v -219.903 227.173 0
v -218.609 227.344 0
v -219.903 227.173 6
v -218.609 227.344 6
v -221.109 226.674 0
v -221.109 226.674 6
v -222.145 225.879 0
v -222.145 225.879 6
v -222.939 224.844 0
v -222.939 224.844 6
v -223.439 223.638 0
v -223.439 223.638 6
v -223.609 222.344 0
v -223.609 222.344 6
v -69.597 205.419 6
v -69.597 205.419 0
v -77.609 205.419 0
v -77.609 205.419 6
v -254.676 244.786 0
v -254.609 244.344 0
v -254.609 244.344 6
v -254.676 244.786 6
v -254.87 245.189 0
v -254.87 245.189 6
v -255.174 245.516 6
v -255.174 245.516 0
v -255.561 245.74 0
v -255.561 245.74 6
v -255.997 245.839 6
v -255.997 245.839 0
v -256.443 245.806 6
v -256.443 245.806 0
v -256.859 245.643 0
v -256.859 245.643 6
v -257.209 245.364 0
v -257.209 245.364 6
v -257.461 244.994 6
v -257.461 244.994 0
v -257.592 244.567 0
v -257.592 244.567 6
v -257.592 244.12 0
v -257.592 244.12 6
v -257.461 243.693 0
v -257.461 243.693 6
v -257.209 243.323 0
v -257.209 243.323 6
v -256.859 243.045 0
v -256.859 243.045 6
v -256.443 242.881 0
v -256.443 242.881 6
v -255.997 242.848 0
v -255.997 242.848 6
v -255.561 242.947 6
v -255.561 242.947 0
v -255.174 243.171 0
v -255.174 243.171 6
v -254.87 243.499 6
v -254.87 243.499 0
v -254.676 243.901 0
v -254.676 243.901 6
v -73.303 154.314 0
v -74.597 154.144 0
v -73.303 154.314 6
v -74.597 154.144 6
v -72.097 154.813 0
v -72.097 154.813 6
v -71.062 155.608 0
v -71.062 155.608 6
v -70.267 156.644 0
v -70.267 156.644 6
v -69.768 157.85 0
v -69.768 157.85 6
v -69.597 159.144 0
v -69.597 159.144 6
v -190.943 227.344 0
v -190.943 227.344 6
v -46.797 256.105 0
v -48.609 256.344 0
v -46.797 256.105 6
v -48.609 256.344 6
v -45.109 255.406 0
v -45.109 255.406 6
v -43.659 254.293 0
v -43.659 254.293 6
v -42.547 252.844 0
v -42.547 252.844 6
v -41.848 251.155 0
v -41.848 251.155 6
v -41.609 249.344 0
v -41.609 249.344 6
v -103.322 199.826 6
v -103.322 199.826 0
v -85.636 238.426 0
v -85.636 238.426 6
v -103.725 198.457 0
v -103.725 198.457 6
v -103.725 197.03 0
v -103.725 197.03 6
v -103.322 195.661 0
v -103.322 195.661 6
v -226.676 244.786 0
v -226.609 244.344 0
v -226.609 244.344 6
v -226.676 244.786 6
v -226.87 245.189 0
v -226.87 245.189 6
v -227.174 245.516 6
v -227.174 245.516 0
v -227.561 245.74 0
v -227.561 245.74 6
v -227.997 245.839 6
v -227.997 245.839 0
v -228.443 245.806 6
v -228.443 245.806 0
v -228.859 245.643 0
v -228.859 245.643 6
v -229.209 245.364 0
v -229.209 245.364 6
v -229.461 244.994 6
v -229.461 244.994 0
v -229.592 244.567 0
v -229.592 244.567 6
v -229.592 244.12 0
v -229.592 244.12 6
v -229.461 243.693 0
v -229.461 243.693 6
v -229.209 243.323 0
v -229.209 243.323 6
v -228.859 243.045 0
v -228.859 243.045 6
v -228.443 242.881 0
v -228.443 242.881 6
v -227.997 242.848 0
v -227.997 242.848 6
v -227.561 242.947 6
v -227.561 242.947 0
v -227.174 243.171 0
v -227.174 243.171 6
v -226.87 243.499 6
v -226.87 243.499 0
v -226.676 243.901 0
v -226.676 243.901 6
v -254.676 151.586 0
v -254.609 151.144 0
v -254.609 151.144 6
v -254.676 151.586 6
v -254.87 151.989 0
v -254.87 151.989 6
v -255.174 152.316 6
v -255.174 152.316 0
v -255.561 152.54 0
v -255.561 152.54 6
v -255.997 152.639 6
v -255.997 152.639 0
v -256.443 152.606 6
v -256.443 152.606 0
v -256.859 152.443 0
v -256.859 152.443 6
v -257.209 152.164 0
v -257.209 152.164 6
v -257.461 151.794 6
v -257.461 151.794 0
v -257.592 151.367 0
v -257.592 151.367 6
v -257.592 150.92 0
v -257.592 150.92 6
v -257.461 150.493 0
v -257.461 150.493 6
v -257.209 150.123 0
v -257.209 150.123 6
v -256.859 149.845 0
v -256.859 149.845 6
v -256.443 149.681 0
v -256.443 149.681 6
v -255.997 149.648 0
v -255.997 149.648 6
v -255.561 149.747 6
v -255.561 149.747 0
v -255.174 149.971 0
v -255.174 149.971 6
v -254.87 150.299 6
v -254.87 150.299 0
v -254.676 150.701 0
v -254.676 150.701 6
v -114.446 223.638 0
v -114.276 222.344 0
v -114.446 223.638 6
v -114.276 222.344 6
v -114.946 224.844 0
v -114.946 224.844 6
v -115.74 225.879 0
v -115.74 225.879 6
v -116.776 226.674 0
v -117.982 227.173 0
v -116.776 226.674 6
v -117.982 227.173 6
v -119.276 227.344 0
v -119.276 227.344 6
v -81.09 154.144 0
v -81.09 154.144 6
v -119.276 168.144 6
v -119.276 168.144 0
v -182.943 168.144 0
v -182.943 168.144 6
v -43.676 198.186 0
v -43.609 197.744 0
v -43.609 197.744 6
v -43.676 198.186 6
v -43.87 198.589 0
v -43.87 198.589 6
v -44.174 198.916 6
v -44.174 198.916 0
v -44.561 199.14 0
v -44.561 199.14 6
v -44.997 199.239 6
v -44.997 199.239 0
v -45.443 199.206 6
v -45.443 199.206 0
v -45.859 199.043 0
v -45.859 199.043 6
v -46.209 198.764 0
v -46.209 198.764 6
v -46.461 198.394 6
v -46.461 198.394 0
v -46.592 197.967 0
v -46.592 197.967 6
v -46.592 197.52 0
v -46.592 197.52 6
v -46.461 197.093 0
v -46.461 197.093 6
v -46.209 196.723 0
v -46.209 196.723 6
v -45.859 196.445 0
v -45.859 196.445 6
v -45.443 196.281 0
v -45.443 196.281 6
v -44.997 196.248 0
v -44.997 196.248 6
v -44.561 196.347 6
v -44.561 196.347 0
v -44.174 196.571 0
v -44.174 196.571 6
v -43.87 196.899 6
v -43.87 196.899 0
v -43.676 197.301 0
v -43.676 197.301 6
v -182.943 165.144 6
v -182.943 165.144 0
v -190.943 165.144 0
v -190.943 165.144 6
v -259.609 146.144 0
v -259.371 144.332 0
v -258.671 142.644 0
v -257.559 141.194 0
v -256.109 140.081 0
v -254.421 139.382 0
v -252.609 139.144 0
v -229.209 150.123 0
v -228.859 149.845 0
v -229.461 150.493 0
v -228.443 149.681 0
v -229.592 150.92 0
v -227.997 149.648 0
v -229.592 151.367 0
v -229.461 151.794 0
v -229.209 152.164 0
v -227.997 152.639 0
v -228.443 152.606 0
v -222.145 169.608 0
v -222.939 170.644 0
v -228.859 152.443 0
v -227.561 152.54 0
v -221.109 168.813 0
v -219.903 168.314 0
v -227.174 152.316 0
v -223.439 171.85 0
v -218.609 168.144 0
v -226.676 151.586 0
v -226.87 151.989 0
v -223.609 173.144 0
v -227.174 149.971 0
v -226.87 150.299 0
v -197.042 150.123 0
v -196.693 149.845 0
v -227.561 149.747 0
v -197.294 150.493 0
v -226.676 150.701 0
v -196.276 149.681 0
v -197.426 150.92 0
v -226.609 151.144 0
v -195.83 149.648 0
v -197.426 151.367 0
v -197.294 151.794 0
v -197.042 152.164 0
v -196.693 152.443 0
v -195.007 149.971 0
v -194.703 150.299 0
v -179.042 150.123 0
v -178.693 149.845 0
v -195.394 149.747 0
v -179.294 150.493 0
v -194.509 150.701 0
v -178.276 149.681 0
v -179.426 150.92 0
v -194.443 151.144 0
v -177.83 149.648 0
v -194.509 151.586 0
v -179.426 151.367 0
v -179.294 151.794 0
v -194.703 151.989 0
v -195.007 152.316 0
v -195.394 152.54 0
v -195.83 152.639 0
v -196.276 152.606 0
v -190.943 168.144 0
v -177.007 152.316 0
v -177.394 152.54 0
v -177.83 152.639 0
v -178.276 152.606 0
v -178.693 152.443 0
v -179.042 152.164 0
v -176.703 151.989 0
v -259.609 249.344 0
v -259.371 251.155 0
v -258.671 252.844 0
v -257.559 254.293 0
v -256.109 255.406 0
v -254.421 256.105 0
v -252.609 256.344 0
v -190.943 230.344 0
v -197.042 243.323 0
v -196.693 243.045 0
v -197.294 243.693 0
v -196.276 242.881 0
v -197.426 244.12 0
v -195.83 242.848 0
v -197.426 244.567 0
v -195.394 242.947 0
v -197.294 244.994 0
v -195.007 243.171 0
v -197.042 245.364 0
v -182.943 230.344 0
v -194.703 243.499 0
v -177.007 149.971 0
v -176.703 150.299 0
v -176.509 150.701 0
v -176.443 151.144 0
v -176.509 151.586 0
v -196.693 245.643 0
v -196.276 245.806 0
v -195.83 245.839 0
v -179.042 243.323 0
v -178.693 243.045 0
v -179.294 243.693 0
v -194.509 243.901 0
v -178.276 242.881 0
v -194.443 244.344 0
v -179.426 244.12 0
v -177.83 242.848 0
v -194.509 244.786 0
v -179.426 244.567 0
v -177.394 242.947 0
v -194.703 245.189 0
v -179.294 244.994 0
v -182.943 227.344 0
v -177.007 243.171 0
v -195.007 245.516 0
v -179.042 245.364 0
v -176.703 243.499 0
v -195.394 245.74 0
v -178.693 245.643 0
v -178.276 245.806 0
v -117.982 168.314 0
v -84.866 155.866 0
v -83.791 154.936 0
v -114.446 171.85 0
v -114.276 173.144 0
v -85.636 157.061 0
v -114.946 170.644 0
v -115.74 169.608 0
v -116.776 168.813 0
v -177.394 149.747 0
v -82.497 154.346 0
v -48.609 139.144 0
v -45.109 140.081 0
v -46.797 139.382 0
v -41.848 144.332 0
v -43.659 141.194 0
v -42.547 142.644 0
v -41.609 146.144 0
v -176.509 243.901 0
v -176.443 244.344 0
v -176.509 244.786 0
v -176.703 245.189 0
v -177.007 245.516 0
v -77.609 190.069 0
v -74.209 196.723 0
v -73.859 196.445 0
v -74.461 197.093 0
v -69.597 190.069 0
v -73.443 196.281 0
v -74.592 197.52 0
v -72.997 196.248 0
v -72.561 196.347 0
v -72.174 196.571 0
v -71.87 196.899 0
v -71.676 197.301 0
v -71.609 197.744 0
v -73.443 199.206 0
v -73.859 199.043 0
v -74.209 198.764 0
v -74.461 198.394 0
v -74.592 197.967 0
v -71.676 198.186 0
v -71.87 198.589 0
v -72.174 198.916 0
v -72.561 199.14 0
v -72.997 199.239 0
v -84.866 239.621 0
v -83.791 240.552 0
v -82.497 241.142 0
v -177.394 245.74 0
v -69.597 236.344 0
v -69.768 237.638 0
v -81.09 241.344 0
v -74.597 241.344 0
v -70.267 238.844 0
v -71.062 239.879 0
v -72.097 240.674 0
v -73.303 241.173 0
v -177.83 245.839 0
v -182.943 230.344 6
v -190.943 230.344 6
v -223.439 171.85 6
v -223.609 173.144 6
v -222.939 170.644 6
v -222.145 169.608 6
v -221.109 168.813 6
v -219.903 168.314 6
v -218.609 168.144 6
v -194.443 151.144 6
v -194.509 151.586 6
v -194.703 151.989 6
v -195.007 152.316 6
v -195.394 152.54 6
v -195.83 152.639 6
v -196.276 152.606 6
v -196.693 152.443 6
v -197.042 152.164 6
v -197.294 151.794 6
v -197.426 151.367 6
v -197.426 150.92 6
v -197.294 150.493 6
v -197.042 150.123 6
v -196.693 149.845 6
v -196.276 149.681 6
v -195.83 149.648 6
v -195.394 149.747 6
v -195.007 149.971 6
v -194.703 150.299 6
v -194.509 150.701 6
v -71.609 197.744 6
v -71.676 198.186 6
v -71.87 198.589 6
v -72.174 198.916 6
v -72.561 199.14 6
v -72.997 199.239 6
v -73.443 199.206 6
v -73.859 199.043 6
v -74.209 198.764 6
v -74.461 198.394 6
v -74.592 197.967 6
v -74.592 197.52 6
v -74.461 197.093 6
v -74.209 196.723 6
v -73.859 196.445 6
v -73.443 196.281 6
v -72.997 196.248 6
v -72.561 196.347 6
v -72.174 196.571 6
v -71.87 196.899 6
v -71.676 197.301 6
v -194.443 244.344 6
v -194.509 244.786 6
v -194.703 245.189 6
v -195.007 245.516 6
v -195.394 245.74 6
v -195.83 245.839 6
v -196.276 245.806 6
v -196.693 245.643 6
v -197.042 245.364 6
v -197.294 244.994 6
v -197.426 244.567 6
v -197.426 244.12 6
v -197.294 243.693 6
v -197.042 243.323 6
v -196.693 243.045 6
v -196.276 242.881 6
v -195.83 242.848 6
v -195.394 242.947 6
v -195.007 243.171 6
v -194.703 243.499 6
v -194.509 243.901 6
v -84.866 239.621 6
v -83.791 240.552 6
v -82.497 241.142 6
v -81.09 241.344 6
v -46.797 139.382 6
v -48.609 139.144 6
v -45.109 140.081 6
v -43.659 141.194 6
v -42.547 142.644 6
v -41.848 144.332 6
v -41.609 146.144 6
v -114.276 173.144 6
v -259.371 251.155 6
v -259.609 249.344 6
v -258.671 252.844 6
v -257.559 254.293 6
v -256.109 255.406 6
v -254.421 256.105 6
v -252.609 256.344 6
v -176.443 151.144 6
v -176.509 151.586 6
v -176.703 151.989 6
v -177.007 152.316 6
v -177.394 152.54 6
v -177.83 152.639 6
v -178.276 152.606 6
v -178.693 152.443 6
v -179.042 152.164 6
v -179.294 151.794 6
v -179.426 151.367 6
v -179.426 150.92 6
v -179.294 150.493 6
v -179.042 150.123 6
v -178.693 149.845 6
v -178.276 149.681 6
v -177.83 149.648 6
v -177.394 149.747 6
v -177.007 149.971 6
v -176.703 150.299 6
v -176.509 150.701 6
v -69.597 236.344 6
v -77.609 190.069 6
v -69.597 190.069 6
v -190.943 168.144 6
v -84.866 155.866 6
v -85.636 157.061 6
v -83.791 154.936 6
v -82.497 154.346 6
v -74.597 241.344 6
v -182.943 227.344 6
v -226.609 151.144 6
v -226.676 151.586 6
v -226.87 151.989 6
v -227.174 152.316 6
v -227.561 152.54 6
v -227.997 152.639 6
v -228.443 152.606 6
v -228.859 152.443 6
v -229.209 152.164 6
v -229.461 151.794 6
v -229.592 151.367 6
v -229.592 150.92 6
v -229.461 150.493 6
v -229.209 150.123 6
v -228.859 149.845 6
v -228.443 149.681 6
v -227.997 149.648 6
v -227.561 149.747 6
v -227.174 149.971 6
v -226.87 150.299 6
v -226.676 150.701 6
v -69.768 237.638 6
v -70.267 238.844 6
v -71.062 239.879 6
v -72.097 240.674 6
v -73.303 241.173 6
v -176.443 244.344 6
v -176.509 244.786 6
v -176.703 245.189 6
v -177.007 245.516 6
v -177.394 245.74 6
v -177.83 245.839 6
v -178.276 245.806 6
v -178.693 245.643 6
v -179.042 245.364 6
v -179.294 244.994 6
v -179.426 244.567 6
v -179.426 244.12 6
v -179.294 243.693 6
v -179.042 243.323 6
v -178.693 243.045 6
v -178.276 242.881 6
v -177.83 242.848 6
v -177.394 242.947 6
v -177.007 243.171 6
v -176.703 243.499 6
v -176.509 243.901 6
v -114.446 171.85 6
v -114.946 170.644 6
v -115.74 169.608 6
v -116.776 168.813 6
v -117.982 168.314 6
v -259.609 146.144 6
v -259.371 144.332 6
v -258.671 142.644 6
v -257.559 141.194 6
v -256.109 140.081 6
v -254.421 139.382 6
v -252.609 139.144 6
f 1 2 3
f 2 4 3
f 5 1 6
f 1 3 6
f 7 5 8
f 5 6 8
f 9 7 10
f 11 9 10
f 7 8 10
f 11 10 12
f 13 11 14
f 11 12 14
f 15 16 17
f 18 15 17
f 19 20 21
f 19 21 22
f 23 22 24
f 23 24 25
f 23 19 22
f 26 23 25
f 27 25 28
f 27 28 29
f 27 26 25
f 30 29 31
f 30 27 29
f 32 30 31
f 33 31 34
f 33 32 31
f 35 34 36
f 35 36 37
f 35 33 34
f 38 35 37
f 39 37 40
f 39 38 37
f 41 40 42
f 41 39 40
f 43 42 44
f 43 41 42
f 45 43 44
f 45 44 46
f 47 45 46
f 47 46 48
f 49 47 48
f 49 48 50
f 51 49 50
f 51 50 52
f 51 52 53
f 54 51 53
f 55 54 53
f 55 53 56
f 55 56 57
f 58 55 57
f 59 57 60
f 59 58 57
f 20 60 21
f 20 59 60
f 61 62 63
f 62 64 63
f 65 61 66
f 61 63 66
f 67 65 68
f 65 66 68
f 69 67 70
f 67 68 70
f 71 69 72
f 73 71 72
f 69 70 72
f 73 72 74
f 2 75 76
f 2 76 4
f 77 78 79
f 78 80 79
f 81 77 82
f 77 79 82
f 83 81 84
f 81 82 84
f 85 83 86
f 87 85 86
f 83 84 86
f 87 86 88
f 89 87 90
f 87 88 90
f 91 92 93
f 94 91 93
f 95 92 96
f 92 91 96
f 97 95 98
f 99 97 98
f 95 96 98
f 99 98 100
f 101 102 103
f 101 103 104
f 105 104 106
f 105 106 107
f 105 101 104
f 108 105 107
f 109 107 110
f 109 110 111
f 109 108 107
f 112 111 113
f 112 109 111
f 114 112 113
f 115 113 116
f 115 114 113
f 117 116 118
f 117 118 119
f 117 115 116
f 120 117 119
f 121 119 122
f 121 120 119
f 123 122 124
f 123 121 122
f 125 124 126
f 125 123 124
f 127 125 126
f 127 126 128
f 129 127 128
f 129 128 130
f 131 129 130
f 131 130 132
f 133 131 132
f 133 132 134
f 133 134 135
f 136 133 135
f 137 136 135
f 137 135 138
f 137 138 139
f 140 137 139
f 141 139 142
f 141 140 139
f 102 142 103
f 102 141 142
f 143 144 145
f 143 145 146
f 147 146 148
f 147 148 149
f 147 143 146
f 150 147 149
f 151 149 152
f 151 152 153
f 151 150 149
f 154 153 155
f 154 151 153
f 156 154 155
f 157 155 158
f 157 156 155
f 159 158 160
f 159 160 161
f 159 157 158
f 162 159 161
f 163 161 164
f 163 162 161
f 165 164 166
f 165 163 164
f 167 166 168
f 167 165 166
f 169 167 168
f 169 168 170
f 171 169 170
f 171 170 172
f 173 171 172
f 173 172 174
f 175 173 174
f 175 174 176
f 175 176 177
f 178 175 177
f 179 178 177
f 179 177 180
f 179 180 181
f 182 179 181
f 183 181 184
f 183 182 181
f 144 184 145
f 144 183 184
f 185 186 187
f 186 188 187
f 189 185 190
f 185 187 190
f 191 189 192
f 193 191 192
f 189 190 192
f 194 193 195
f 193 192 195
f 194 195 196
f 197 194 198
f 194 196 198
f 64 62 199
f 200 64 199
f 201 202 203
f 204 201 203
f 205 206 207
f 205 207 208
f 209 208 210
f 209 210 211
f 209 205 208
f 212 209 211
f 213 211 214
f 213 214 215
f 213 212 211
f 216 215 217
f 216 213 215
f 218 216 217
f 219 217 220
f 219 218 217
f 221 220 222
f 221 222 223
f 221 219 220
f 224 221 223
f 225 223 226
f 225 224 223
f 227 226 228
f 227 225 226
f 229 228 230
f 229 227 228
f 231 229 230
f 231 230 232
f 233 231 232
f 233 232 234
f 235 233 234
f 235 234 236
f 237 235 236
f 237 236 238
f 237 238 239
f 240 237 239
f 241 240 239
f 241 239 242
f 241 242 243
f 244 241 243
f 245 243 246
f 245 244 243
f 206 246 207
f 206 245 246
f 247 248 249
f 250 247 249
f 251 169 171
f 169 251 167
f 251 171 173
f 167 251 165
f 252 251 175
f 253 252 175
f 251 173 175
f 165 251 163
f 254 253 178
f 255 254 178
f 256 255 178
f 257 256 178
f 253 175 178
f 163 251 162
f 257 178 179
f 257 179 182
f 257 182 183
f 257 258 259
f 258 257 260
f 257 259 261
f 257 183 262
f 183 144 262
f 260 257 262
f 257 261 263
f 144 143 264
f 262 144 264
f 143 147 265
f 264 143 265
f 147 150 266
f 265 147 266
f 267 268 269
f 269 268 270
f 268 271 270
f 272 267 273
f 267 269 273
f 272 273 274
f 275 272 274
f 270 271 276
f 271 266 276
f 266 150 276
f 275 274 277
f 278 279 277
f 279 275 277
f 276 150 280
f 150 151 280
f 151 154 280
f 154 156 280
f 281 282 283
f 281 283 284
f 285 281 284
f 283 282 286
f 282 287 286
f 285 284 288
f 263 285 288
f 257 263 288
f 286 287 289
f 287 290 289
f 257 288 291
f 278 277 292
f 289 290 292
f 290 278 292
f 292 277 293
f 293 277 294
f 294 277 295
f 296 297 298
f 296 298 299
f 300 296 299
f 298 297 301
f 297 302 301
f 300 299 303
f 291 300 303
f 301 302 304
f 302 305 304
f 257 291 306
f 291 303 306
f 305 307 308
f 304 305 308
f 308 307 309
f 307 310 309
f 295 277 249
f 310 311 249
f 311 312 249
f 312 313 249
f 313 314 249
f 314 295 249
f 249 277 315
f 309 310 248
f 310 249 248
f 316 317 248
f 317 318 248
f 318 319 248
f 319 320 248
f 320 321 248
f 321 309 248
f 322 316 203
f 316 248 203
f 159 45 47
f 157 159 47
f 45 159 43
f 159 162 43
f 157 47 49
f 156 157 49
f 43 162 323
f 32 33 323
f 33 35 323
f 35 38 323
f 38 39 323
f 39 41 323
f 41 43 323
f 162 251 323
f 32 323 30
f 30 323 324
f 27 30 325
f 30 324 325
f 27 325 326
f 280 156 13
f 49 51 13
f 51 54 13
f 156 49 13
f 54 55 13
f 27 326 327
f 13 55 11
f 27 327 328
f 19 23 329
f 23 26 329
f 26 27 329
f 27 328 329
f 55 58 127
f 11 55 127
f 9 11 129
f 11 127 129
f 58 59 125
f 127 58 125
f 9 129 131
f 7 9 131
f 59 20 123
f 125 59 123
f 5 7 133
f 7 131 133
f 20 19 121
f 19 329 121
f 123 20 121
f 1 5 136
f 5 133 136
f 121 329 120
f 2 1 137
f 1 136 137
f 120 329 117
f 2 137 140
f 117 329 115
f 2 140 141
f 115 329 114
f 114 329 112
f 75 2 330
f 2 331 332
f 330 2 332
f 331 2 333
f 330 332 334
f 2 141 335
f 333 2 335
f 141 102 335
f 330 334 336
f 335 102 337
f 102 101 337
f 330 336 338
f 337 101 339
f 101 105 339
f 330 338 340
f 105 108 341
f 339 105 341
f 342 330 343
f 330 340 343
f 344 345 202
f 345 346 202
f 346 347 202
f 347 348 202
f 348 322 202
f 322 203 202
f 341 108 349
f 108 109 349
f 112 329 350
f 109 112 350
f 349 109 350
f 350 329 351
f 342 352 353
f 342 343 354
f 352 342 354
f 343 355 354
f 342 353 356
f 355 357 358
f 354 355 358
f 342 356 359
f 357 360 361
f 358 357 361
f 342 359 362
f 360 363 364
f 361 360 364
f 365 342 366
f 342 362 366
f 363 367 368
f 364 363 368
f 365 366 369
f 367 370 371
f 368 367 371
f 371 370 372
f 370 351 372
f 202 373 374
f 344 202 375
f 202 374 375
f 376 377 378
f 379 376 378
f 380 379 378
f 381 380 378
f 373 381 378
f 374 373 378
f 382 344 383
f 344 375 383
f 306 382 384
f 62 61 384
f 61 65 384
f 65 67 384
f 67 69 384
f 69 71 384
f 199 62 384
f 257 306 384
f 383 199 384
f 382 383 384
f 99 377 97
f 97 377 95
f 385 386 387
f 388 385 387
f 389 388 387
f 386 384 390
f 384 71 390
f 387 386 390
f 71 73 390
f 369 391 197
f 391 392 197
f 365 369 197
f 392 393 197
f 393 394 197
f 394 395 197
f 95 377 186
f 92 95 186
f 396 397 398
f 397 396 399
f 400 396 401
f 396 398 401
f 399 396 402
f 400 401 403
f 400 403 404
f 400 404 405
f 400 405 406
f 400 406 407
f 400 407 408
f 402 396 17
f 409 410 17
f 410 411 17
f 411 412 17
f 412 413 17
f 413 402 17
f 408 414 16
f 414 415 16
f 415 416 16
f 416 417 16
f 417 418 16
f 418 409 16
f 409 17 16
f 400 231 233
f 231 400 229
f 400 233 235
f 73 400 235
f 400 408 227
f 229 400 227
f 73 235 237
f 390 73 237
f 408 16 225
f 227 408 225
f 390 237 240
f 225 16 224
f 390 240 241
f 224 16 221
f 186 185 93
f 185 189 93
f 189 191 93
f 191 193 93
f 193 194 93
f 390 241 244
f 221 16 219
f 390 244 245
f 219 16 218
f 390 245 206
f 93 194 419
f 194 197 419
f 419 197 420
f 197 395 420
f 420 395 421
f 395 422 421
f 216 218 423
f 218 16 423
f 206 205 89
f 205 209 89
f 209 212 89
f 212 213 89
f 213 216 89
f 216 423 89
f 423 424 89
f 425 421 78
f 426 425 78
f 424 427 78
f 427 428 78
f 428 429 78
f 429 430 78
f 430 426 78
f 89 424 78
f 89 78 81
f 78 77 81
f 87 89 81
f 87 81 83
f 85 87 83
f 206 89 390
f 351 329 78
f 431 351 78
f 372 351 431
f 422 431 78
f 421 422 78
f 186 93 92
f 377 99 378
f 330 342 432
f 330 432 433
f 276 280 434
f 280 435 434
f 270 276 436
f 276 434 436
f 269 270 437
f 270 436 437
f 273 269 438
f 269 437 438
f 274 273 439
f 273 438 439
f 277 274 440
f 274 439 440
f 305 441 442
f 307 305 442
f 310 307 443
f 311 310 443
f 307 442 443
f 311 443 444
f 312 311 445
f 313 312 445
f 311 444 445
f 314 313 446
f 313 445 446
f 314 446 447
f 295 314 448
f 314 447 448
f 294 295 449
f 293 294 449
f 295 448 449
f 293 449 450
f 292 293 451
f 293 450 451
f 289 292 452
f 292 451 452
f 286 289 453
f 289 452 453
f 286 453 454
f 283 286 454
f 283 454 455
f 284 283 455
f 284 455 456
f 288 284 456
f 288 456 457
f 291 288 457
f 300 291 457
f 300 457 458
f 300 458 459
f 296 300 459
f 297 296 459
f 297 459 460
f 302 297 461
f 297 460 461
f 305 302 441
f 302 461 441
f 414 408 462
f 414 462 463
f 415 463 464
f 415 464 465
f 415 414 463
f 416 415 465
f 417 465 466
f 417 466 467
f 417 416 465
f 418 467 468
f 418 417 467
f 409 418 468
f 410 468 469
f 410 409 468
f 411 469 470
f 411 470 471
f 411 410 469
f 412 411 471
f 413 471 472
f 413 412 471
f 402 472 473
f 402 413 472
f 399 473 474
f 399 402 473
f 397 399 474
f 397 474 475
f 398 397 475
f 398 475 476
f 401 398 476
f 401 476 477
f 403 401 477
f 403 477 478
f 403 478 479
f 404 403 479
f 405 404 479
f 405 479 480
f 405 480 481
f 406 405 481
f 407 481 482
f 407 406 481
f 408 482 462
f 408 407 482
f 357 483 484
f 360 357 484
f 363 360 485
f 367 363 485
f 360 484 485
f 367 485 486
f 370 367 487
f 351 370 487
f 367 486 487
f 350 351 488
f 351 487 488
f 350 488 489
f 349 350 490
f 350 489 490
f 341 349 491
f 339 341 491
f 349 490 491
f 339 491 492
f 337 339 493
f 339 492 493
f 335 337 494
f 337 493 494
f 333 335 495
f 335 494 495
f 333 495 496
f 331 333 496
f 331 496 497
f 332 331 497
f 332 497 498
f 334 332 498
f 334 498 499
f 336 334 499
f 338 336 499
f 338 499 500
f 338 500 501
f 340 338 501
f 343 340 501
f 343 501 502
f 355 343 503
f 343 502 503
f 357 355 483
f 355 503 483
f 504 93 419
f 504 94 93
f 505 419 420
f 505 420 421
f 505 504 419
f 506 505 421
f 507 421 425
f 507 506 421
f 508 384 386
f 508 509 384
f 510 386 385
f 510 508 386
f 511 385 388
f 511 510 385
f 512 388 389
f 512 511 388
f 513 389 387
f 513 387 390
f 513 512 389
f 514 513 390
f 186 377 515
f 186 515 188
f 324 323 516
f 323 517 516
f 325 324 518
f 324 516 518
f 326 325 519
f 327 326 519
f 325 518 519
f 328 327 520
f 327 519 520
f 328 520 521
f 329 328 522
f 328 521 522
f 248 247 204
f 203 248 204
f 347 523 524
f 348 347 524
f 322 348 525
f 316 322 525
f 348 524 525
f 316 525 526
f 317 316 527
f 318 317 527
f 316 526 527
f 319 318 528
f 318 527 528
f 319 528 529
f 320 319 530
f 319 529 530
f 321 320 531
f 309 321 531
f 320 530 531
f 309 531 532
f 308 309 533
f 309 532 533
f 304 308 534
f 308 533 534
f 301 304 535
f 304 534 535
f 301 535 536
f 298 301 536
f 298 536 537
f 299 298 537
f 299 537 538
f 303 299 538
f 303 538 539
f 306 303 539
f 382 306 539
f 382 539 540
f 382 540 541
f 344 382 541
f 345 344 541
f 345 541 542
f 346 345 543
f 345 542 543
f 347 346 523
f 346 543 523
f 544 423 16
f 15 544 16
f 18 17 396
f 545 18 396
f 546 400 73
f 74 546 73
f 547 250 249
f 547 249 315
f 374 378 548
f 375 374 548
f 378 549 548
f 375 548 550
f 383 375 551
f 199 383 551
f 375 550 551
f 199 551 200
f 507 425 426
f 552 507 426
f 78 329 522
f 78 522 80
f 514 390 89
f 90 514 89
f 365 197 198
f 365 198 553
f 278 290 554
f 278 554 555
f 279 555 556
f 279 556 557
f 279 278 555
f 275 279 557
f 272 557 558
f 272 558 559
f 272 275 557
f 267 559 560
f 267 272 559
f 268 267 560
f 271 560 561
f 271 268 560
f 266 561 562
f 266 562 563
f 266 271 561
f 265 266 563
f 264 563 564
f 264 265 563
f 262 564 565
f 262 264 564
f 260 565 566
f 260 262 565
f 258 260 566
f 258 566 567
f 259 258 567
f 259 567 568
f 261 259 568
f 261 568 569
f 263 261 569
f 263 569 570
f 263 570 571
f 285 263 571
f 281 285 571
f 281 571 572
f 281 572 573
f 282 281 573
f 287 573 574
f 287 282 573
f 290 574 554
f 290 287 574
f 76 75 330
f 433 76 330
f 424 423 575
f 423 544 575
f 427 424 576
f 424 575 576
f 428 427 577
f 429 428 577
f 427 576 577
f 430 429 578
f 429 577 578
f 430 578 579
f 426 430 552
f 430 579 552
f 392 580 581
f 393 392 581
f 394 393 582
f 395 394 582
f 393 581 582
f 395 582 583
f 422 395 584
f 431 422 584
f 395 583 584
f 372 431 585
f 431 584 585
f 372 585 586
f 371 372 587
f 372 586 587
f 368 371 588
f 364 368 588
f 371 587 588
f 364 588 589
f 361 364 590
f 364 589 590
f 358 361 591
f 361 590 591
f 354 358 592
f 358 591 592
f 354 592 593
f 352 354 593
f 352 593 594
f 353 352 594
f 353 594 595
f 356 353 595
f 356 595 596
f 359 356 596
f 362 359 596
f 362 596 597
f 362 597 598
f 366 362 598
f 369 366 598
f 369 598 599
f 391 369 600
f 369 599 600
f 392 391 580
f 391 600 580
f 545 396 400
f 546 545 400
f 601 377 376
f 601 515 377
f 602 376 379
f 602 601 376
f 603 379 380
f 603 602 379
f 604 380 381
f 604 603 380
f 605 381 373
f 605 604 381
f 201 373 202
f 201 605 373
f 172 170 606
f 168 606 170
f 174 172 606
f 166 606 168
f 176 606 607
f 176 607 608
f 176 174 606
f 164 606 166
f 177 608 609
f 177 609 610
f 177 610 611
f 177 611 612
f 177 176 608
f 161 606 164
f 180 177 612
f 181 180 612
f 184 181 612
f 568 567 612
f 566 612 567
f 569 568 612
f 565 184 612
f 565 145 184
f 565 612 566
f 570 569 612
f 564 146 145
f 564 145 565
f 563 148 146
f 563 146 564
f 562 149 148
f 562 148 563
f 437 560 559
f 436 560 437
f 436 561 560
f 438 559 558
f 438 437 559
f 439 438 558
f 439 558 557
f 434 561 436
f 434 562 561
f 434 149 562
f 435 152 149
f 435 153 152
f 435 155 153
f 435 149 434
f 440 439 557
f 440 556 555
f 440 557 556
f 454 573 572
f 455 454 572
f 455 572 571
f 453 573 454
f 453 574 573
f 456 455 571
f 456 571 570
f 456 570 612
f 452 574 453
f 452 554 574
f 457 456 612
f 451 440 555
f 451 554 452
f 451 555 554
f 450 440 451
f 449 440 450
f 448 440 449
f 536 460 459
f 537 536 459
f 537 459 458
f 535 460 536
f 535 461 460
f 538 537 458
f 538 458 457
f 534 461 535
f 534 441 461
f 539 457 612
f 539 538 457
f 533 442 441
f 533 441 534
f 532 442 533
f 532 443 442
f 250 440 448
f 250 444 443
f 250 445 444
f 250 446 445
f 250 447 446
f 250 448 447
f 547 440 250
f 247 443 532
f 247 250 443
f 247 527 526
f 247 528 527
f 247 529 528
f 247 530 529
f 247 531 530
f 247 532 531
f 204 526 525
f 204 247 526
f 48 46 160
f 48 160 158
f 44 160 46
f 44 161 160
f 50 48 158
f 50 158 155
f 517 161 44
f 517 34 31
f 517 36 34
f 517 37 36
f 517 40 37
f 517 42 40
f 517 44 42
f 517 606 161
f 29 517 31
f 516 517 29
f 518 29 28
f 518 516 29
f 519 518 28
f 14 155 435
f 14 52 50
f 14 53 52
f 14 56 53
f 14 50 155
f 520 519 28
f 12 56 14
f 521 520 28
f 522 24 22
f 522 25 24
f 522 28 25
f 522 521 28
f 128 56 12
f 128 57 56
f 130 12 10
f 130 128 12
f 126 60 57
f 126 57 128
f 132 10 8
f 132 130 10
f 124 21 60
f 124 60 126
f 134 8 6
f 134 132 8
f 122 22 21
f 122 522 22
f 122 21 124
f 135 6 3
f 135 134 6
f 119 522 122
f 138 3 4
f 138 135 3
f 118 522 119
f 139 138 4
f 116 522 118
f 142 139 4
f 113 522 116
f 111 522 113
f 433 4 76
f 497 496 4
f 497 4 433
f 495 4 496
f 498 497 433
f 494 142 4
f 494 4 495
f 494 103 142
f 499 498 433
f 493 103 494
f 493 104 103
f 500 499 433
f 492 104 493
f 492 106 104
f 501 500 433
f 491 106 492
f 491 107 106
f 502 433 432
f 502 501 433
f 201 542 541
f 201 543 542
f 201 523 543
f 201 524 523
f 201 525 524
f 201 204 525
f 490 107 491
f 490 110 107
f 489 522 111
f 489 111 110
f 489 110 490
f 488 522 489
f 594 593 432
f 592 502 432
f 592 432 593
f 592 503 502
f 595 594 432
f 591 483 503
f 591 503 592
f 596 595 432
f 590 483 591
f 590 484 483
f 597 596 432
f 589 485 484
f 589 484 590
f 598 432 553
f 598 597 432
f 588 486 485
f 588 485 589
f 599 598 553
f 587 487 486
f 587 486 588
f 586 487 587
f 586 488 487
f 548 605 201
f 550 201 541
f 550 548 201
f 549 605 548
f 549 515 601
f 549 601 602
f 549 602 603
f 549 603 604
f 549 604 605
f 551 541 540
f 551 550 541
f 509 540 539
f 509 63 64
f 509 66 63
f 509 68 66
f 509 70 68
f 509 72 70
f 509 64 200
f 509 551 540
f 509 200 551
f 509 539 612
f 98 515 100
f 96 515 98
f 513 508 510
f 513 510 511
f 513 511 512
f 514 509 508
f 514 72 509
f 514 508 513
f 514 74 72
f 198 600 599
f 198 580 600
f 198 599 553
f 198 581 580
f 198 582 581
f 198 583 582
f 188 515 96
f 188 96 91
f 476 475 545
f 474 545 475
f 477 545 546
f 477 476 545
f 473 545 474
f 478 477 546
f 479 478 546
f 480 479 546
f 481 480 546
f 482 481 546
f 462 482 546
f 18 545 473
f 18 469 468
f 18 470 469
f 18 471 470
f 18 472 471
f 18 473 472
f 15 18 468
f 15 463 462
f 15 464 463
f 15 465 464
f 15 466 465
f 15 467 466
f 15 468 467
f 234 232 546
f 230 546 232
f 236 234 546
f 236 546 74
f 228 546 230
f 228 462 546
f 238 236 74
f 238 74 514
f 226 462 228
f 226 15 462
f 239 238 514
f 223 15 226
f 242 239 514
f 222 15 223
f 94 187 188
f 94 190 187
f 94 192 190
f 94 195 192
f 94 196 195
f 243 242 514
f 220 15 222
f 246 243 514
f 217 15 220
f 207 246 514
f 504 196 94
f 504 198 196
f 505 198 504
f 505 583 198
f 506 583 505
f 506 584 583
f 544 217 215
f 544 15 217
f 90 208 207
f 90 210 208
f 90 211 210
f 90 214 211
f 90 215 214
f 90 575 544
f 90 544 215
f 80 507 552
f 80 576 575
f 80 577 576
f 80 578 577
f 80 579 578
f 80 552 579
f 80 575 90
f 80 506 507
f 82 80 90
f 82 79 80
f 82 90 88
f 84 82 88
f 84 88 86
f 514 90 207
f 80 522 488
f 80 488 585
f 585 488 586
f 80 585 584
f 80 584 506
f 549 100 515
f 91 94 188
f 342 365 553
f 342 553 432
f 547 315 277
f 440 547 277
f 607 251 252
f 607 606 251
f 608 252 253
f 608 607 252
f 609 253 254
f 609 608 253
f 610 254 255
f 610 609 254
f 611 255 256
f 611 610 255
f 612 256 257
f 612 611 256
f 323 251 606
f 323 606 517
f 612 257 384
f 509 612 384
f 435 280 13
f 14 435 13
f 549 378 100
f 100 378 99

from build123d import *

# Parameters (mm, degrees)
SKETCH1_W           = 218
SKETCH1_H           = 117.2
SKETCH1_R           = 1.5
BOSS_EXTRUDE1_DEPTH = 6
SKETCH2_R           = 1.5
CUT_EXTRUDE1_DEPTH  = 6
FILLET1_R           = 7
SKETCH3_W           = 109.333333333
SKETCH3_H           = 59.2
CUT_EXTRUDE2_DEPTH  = 10
FILLET3_R           = 5
CUT_EXTRUDE3_DEPTH  = 10
FILLET4_R           = 5
SKETCH5_W           = 8
SKETCH5_H           = 65.2
CUT_EXTRUDE4_DEPTH  = 10


with BuildPart() as part:
    # Sketch1 → Boss-Extrude1 (new body)
    with BuildSketch(Plane.XY):
        with Locations((-150.609177744, 197.743600407)):
            Rectangle(SKETCH1_W, SKETCH1_H)
        with Locations((-256.109177744, 244.343600407)):
            Circle(SKETCH1_R, mode=Mode.SUBTRACT)
        with Locations((-256.109177744, 151.143600407)):
            Circle(SKETCH1_R, mode=Mode.SUBTRACT)
        with Locations((-45.109177744, 197.743600407)):
            Circle(SKETCH1_R, mode=Mode.SUBTRACT)
        with Locations((-73.109177744, 197.743600407)):
            Circle(SKETCH1_R, mode=Mode.SUBTRACT)
        with Locations((-228.109177744, 244.343600407)):
            Circle(SKETCH1_R, mode=Mode.SUBTRACT)
        with Locations((-228.109177744, 151.143600407)):
            Circle(SKETCH1_R, mode=Mode.SUBTRACT)
    extrude(amount=BOSS_EXTRUDE1_DEPTH)

    # Sketch2 → Cut-Extrude1 (cut)
    with BuildSketch(Plane.XY.offset(6)):
        with Locations((-195.942511077, 151.143600407)):
            Circle(SKETCH2_R)
        with Locations((-177.942511077, 151.143600407)):
            Circle(SKETCH2_R)
        with Locations((-195.942511077, 244.343600407)):
            Circle(SKETCH2_R)
        with Locations((-177.942511077, 244.343600407)):
            Circle(SKETCH2_R)
    extrude(amount=-CUT_EXTRUDE1_DEPTH, mode=Mode.SUBTRACT)

    # Fillet1
    fillet1_edges = [part.edges().sort_by_distance(p)[0] for p in [
        (-259.609177744, 256.343600407, 3),
        (-41.609177744, 256.343600407, 3),
        (-41.609177744, 139.143600407, 3),
        (-259.609177744, 139.143600407, 3),
    ]]
    fillet(fillet1_edges, radius=FILLET1_R)

    # Sketch3 → Cut-Extrude2 (cut)
    with BuildSketch(Plane(origin=(0, 0, 0), x_dir=(-1, 0, 0), z_dir=(0, 0, -1))):
        with Locations((168.942511078, 197.743600407)):
            Rectangle(SKETCH3_W, SKETCH3_H)
    extrude(amount=-CUT_EXTRUDE2_DEPTH, mode=Mode.SUBTRACT)

    # Fillet3
    fillet3_edges = [part.edges().sort_by_distance(p)[0] for p in [
        (-114.275844411, 227.343600407, 3),
        (-223.609177744, 227.343600407, 3),
        (-223.609177744, 168.143600407, 3),
        (-114.275844411, 168.143600407, 3),
    ]]
    fillet(fillet3_edges, radius=FILLET3_R)

    # Sketch4 → Cut-Extrude3 (cut)
    with BuildSketch(Plane(origin=(0, 0, 0), x_dir=(-1, 0, 0), z_dir=(0, 0, -1))):
        Polygon((84.298987117, 241.343600407), (69.597266226, 241.343600407), (69.597266226, 205.418600407), (77.609177744, 205.418600407), (77.609177744, 190.068600407), (69.597266226, 190.068600407), (69.597266226, 154.143600407), (84.298987117, 154.143600407), (104.275844411, 197.743600407), align=None)
    extrude(amount=-CUT_EXTRUDE3_DEPTH, mode=Mode.SUBTRACT)

    # Fillet4
    fillet4_edges = [part.edges().sort_by_distance(p)[0] for p in [
        (-69.597266226, 241.343600407, 3),
        (-84.298987117, 241.343600407, 3),
        (-104.275844411, 197.743600407, 3),
        (-84.298987117, 154.143600407, 3),
        (-69.597266226, 154.143600407, 3),
    ]]
    fillet(fillet4_edges, radius=FILLET4_R)

    # Sketch5 → Cut-Extrude4 (cut)
    with BuildSketch(Plane(origin=(0, 0, 0), x_dir=(-1, 0, 0), z_dir=(0, 0, -1))):
        with Locations((186.942511077, 197.743600407)):
            Rectangle(SKETCH5_W, SKETCH5_H)
    extrude(amount=-CUT_EXTRUDE4_DEPTH, mode=Mode.SUBTRACT)


solid = part.part
